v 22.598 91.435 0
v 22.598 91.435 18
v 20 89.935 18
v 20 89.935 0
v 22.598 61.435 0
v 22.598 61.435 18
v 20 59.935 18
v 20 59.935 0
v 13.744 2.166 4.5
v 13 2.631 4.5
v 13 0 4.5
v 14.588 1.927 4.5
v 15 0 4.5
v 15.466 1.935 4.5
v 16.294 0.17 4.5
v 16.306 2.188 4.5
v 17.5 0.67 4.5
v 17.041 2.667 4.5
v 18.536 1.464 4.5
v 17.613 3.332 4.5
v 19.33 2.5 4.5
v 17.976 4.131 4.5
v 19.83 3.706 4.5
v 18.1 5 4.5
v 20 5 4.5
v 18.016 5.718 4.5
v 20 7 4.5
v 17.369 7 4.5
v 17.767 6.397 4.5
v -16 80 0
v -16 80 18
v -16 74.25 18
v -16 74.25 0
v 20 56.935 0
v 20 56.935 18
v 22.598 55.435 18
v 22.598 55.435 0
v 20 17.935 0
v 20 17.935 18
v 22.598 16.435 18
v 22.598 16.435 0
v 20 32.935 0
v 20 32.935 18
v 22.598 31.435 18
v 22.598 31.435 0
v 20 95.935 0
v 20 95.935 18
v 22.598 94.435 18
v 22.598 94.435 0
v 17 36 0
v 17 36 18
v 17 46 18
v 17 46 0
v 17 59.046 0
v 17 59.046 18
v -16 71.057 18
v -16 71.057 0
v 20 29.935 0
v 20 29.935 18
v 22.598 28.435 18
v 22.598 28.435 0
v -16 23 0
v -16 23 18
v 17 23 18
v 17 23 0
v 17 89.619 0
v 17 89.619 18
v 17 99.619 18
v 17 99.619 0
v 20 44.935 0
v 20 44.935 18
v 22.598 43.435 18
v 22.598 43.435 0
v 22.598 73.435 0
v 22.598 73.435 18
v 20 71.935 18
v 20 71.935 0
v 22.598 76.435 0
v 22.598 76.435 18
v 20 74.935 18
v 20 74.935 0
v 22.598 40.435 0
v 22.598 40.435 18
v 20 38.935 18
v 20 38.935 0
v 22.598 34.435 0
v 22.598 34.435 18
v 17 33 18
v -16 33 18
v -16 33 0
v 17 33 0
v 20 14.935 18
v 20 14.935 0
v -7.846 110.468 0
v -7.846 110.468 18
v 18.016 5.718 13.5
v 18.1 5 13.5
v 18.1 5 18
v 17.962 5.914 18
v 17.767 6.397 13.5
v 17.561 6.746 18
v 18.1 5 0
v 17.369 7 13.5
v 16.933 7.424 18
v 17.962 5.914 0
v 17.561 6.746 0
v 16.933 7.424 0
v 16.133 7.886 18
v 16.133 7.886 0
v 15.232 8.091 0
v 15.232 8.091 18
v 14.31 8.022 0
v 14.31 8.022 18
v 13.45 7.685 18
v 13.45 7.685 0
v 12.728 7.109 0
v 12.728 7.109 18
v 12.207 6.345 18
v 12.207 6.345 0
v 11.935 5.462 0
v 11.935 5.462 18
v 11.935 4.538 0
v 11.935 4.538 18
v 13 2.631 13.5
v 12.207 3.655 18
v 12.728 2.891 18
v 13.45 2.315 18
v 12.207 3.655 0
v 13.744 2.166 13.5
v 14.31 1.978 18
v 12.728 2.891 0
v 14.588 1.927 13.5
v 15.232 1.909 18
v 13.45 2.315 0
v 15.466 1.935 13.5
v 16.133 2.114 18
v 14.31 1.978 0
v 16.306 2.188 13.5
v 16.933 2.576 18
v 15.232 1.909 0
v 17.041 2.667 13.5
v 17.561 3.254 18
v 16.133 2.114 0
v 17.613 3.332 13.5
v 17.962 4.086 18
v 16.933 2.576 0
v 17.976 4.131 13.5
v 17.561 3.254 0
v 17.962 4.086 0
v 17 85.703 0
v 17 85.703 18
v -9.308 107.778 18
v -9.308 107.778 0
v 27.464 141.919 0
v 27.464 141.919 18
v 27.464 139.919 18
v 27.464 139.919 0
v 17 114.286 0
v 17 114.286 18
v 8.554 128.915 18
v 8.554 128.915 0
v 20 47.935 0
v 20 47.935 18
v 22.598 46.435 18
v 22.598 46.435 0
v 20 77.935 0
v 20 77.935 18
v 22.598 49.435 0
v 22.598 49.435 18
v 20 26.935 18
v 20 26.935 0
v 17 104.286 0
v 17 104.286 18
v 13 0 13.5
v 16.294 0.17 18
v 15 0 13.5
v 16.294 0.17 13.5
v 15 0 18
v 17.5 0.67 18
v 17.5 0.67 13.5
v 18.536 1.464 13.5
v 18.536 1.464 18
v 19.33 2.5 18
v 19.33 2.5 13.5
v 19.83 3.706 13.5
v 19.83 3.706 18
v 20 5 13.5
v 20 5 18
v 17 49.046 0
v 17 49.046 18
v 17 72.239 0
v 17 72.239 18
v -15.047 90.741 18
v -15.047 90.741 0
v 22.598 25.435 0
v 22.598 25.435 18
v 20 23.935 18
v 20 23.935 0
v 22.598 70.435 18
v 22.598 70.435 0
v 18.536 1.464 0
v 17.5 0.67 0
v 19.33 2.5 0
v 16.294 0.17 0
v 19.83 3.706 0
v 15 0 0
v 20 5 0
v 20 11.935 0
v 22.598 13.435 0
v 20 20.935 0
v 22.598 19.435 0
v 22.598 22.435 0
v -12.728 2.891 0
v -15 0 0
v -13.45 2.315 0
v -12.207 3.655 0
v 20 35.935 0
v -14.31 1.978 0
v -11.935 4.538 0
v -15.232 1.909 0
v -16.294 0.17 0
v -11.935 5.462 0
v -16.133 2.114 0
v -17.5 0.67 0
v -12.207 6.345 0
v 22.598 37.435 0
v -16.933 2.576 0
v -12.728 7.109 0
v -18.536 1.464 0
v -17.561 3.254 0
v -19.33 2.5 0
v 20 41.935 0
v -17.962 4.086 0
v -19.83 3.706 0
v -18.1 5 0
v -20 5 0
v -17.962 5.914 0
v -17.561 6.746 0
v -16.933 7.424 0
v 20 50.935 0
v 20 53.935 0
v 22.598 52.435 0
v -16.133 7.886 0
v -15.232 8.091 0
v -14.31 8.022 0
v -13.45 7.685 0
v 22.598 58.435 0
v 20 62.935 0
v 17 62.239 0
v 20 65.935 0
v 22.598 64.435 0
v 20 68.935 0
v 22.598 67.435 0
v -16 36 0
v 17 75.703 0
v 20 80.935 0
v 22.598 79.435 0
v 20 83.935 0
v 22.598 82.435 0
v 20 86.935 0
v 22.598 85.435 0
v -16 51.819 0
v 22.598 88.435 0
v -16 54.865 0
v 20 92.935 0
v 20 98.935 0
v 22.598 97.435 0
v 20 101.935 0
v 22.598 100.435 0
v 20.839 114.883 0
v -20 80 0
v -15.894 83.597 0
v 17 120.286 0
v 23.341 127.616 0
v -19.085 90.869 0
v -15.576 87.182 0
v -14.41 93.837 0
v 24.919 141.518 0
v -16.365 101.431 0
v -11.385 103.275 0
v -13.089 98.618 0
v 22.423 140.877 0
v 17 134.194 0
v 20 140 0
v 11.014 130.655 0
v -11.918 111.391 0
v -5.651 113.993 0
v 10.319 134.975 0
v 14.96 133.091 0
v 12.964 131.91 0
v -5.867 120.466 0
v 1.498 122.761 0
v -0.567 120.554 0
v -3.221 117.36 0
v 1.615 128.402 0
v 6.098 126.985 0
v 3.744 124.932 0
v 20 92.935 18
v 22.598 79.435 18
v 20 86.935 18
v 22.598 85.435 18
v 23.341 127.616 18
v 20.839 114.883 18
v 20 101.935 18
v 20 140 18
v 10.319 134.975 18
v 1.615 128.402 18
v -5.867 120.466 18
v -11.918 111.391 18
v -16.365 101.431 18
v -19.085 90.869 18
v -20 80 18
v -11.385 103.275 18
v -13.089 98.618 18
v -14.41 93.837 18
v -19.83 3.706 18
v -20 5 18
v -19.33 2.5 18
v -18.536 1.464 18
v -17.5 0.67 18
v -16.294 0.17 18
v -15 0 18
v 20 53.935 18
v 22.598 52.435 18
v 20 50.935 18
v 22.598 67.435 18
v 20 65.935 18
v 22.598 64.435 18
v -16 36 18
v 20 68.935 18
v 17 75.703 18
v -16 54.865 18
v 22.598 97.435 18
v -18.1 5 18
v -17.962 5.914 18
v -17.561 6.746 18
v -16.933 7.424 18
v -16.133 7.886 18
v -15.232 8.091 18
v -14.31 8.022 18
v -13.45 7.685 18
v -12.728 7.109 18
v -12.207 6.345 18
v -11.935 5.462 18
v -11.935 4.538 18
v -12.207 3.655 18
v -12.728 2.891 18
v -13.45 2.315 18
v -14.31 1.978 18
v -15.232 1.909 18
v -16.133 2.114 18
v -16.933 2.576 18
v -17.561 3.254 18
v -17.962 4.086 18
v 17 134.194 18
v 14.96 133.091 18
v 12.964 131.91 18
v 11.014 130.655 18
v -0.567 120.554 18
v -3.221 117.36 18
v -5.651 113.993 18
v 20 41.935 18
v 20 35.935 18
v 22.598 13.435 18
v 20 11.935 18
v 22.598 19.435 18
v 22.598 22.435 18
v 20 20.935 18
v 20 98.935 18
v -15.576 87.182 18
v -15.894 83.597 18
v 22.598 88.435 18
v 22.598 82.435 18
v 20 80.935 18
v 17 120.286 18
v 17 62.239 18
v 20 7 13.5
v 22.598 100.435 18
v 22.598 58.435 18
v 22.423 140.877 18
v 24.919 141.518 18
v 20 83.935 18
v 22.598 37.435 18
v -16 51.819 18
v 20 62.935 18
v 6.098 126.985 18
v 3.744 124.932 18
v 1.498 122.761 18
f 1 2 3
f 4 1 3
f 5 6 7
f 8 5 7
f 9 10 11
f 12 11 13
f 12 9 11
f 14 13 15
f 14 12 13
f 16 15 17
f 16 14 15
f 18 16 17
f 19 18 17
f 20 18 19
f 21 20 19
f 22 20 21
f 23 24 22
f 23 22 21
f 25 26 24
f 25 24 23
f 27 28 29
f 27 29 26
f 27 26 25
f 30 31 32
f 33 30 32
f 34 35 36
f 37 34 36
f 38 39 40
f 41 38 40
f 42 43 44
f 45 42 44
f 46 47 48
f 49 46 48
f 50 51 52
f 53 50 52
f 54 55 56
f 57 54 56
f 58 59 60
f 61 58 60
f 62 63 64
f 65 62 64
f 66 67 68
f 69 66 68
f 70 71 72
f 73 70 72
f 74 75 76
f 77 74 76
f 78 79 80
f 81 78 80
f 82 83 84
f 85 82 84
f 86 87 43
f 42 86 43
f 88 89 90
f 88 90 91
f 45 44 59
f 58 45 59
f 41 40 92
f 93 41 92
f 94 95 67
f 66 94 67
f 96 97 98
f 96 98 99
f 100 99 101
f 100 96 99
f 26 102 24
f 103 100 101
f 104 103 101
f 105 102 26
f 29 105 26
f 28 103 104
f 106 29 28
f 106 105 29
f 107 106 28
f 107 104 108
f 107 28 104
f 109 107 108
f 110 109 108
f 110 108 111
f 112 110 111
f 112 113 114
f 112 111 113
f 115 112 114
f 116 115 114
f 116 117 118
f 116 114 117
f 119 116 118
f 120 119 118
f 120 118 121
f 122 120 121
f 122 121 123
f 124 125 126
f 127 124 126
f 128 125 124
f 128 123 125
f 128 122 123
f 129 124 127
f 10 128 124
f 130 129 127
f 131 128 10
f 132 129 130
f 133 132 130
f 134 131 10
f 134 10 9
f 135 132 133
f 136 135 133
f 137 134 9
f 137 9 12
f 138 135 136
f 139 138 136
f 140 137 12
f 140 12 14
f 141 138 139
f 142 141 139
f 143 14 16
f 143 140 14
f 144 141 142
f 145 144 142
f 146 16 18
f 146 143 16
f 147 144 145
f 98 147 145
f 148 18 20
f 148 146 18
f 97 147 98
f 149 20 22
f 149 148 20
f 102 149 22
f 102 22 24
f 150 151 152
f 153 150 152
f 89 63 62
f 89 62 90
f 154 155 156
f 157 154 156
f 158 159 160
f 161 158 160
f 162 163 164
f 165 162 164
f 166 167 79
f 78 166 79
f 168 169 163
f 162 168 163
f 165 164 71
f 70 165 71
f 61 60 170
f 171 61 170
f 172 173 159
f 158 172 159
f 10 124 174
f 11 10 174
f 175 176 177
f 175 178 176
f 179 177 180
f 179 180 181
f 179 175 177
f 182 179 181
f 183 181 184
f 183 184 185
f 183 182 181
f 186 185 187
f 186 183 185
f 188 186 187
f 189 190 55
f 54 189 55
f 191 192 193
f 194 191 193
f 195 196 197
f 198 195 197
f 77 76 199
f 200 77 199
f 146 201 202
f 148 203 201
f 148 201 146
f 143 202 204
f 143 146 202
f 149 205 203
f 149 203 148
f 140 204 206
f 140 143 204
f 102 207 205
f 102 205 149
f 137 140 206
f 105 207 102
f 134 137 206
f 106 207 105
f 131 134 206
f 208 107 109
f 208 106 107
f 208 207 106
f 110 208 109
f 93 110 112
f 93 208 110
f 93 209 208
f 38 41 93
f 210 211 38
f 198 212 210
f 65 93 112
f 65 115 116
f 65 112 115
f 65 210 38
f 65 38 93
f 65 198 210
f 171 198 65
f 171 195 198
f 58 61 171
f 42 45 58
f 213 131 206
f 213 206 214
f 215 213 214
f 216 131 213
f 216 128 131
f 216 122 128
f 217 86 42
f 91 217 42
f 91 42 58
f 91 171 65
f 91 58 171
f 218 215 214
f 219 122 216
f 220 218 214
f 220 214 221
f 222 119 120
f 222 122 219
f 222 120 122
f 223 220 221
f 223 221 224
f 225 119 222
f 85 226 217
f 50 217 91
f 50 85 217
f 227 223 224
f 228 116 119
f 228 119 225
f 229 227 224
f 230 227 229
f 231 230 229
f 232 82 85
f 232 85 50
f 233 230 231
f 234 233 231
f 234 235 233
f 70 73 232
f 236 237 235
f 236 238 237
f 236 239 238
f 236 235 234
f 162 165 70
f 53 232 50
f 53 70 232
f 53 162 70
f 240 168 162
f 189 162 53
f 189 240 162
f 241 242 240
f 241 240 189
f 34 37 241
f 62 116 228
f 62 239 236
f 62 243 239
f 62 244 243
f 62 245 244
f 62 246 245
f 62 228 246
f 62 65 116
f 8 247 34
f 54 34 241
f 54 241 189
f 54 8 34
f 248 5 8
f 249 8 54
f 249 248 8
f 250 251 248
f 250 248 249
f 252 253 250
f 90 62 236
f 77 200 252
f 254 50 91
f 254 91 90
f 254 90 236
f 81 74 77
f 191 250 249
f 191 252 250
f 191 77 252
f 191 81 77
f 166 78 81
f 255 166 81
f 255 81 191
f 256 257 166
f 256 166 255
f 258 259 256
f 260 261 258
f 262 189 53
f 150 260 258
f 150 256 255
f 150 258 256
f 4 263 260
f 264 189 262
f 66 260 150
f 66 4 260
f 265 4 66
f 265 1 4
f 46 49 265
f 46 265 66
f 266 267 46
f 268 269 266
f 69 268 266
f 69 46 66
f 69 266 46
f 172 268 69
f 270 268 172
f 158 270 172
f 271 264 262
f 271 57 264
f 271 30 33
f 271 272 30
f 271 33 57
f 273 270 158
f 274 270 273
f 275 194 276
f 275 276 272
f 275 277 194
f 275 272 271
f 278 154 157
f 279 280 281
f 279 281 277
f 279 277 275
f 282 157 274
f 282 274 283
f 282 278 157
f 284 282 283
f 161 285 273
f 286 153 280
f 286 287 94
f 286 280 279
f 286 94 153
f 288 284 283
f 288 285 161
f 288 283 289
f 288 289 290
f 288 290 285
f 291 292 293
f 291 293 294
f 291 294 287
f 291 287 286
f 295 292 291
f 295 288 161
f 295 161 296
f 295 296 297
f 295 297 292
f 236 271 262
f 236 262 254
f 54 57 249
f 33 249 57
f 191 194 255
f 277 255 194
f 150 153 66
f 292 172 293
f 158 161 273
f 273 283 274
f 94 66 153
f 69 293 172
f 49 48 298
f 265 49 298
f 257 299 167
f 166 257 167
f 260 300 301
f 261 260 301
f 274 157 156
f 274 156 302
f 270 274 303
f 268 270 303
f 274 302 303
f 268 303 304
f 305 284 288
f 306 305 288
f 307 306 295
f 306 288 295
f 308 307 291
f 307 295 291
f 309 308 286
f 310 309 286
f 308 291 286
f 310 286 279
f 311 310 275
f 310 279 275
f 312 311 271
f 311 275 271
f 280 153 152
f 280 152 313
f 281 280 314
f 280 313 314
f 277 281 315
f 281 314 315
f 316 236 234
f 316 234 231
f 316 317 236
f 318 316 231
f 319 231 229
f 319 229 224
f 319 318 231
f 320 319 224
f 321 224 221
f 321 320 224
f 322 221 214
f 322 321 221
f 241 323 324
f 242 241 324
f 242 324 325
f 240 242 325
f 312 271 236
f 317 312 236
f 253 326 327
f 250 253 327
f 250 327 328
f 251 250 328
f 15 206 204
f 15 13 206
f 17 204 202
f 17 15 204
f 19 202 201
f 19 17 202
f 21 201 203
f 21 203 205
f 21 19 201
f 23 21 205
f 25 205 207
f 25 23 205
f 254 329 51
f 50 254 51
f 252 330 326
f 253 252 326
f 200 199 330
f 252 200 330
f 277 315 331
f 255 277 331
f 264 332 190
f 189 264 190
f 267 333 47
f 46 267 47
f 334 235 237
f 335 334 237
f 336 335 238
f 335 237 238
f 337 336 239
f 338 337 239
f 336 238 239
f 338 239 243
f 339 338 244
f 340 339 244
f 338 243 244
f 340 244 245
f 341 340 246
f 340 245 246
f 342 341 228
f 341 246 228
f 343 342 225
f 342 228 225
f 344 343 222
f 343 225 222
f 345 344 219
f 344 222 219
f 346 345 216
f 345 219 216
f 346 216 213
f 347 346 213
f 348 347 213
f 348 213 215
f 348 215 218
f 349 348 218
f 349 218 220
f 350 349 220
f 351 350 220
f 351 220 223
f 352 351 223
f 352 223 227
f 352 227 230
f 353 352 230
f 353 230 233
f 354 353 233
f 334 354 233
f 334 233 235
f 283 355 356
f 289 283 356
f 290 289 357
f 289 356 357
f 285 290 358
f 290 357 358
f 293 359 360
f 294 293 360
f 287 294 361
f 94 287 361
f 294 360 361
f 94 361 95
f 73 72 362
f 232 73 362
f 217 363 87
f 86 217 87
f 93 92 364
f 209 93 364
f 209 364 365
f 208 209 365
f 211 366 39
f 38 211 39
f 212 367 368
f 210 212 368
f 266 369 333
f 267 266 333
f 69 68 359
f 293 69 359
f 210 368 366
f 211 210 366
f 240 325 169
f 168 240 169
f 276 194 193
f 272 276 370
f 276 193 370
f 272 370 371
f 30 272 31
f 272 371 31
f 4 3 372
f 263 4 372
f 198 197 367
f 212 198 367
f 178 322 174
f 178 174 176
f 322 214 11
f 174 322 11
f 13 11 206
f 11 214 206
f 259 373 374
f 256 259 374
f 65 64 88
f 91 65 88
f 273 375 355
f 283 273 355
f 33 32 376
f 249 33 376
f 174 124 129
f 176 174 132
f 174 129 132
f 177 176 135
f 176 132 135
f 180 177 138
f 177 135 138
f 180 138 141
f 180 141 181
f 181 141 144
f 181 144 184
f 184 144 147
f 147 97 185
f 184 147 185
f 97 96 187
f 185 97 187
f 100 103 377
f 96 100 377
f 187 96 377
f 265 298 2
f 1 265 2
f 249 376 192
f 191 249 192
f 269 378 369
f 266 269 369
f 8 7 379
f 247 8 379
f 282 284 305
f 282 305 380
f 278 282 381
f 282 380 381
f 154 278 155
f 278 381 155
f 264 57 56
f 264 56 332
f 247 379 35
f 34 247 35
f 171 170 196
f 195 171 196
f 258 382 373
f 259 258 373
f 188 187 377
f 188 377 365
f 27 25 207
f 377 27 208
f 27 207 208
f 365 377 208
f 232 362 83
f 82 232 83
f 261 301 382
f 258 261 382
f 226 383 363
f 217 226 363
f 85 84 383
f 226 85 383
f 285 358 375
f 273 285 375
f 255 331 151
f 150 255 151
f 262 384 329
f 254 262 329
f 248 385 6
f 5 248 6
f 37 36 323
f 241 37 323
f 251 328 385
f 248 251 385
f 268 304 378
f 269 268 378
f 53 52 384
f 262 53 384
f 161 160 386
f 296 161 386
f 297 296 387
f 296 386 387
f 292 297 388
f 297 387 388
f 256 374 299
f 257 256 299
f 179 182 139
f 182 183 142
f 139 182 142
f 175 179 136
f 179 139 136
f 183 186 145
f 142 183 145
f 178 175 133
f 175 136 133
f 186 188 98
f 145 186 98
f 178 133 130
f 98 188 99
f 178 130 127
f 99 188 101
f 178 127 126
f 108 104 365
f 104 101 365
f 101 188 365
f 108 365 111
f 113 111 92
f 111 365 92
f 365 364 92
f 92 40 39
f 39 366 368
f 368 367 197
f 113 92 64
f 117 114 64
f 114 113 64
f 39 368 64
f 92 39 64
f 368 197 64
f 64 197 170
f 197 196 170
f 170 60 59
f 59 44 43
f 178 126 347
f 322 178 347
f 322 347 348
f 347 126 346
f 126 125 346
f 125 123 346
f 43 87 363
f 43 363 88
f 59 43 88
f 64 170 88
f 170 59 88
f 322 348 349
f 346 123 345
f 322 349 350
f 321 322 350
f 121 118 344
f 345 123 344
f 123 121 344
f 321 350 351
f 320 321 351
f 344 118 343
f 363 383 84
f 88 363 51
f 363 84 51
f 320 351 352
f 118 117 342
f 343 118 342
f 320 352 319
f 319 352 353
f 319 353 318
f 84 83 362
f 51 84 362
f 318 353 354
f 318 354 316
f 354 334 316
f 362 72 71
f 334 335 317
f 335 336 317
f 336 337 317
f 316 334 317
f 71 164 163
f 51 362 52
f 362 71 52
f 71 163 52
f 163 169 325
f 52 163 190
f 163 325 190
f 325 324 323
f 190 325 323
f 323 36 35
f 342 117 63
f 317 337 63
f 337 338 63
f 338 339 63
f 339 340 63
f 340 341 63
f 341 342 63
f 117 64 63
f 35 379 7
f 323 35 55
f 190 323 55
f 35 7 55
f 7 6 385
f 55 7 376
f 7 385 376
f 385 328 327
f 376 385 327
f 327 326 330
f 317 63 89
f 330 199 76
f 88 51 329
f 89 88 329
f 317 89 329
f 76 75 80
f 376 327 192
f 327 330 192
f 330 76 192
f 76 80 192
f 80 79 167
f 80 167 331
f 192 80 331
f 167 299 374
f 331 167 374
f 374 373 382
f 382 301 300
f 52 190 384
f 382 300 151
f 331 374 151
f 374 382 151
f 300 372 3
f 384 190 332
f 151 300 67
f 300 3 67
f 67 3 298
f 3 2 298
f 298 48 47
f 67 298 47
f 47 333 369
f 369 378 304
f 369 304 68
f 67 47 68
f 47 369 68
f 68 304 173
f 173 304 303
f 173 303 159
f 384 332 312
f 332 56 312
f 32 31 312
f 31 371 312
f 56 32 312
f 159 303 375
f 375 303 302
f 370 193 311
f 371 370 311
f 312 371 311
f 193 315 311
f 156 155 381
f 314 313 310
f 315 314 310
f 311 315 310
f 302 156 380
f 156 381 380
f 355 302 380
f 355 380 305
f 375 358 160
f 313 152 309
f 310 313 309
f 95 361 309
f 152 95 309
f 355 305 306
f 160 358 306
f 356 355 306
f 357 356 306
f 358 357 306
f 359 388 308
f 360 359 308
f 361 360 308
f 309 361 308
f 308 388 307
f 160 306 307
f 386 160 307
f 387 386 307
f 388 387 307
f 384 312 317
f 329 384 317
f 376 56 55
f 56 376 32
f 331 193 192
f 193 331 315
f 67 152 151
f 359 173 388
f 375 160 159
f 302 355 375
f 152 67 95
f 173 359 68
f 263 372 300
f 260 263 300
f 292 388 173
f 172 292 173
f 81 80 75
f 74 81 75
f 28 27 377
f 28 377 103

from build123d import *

# Parameters (mm, degrees)
BOSS_EXTRUDE1_DEPTH     = 18
SKETCH3_W               = 33
SKETCH3_H               = 10
CUT_EXTRUDE1_DEPTH      = 143.562267098
CUT_EXTRUDE2_DEPTH      = 143.562267098
CUT_EXTRUDE3_DEPTH      = 143.562267098
CUT_EXTRUDE4_DEPTH      = 143.562267098
BOSS_EXTRUDE2_DEPTH     = 18
BOSS_EXTRUDE3_DEPTH     = 18
LPATTERN1_COUNT         = 30
LPATTERN1_PITCH         = 3
CUT_EXTRUDE5_DEPTH      = 146.668613805
CUT_EXTRUDE6_DEPTH      = 146.668613805
CUT_EXTRUDE7_DEPTH      = 146.668613805
CUT_EXTRUDE8_DEPTH      = 146.668613805
CUT_EXTRUDE9_DEPTH      = 4.5
CUT_EXTRUDE9_DEPTH_BACK = 4.5
FILLET1_R               = 5
F_6_0_MM_DOWEL_HOLES1_D = 6.2


with BuildPart() as part:
    # Sketch2 → Boss-Extrude1 (new body)
    with BuildSketch(Plane.XY):
        with BuildLine():
            Line((-20, 0), (20, 0))
            Line((20, 0), (20, 140))
            ThreePointArc((20, 140), (-9.083269132, 116.055512755), (-20, 80))
            Line((-20, 80), (-20, 0))
        make_face()
    extrude(amount=BOSS_EXTRUDE1_DEPTH)

    # Sketch3 → Cut-Extrude1 (cut, through all)
    with BuildSketch(Plane.XY.offset(18)):
        with Locations((0.5, 28)):
            Rectangle(SKETCH3_W, SKETCH3_H)
    extrude(amount=-CUT_EXTRUDE1_DEPTH, mode=Mode.SUBTRACT)

    # Sketch4 → Cut-Extrude2 (cut, through all)
    with BuildSketch(Plane.XY.offset(18)):
        Polygon((-16, 36), (17, 36), (17, 46), (-16, 51.818790363), align=None)
    extrude(amount=-CUT_EXTRUDE2_DEPTH, mode=Mode.SUBTRACT)

    # Sketch5 → Cut-Extrude3 (cut, through all)
    with BuildSketch(Plane.XY.offset(18)):
        Polygon((-16, 54.865070199), (17, 49.046279836), (17, 59.046279836), (-16, 71.057297566), align=None)
    extrude(amount=-CUT_EXTRUDE3_DEPTH, mode=Mode.SUBTRACT)

    # Sketch6 → Cut-Extrude4 (cut, through all)
    with BuildSketch(Plane.XY.offset(18)):
        with BuildLine():
            Line((-16, 74.249830884), (17, 62.238813153))
            Line((17, 62.238813153), (17, 72.238813153))
            Line((17, 72.238813153), (-15.046889298, 90.741093316))
            ThreePointArc((-15.046889298, 90.741093316), (-15.761255119, 85.391648765), (-16, 80))
            Line((-16, 80), (-16, 74.249830884))
        make_face()
    extrude(amount=-CUT_EXTRUDE4_DEPTH, mode=Mode.SUBTRACT)

    # Sketch13 → Boss-Extrude2 (add)
    with BuildSketch(Plane.XY.offset(18)):
        with BuildLine():
            Line((27.463865989, 141.919276749), (27.463865989, 139.919276749))
            ThreePointArc((27.463865989, 139.919276749), (21.883638711, 121.290161062), (20, 101.934676234))
            Line((20, 101.934676234), (20, 140))
            ThreePointArc((20, 140), (23.663152719, 141.227117654), (27.463865989, 141.919276749))
        make_face()
    extrude(amount=-BOSS_EXTRUDE2_DEPTH)

    # Sketch15 → Boss-Extrude3 (add)
    with BuildSketch(Plane.XY.offset(18)):
        Polygon((20, 101.934676234), (22.598076211, 100.434676234), (20, 98.934676234), align=None)
    boss_extrude3 = extrude(amount=-BOSS_EXTRUDE3_DEPTH)

    # LPattern1: Boss-Extrude3 ×30
    with Locations(*[(0, -i * LPATTERN1_PITCH, 0) for i in range(1, LPATTERN1_COUNT)]):
        add(boss_extrude3)

    # Sketch17 → Cut-Extrude5 (cut, through all)
    with BuildSketch(Plane.XY.offset(18)):
        with BuildLine():
            Line((-14.409820926, 93.837383335), (17, 75.702914768))
            Line((17, 75.702914768), (17, 85.702914768))
            Line((17, 85.702914768), (-9.308172311, 107.778092451))
            ThreePointArc((-9.308172311, 107.778092451), (-12.284651864, 100.963507838), (-14.409820926, 93.837383335))
        make_face()
    extrude(amount=-CUT_EXTRUDE5_DEPTH, mode=Mode.SUBTRACT)

    # Sketch18 → Cut-Extrude6 (cut, through all)
    with BuildSketch(Plane.XY.offset(18)):
        with BuildLine():
            Line((-7.846238812, 110.46760646), (17, 89.619136636))
            Line((17, 89.619136636), (17, 99.619136636))
            Line((17, 99.619136636), (-0.566824758, 120.554463152))
            ThreePointArc((-0.566824758, 120.554463152), (-4.464319866, 115.697073553), (-7.846238812, 110.46760646))
        make_face()
    extrude(amount=-CUT_EXTRUDE6_DEPTH, mode=Mode.SUBTRACT)

    # Sketch19 → Cut-Extrude7 (cut, through all)
    with BuildSketch(Plane.XY.offset(18)):
        with BuildLine():
            Line((1.497556464, 122.761400894), (17, 104.286308117))
            Line((17, 104.286308117), (17, 114.286308117))
            Line((17, 114.286308117), (8.554035532, 128.915147695))
            ThreePointArc((8.554035532, 128.915147695), (4.907555132, 125.973860666), (1.497556464, 122.761400894))
        make_face()
    extrude(amount=-CUT_EXTRUDE7_DEPTH, mode=Mode.SUBTRACT)

    # Sketch21 → Cut-Extrude8 (cut, through all)
    with BuildSketch(Plane.XY.offset(18)):
        with BuildLine():
            Line((11.013641865, 130.654984559), (17, 120.286308117))
            Line((17, 120.286308117), (17, 134.194095619))
            ThreePointArc((17, 134.194095619), (13.956345649, 132.509918344), (11.013641865, 130.654984559))
        make_face()
    extrude(amount=-CUT_EXTRUDE8_DEPTH, mode=Mode.SUBTRACT)

    # Sketch25 → Cut-Extrude9 (cut, two sides: drawn at the far end of the back side and taken through both)
    with BuildSketch(Plane(origin=(0, 0, 9), x_dir=(-1, 0, 0), z_dir=(0, 0, -1)).offset(-CUT_EXTRUDE9_DEPTH_BACK)):
        with BuildLine():
            Line((-20, 0), (-20, 7))
            Line((-20, 7), (-17, 7))
            ThreePointArc((-17, 7), (-14.171572875, 5.828427125), (-13, 3))
            Line((-13, 3), (-13, 0))
            Line((-13, 0), (-20, 0))
        make_face()
    extrude(amount=CUT_EXTRUDE9_DEPTH + CUT_EXTRUDE9_DEPTH_BACK, mode=Mode.SUBTRACT)

    # Fillet1
    fillet1_edges = [part.edges().sort_by_distance(p)[0] for p in [
        (20, 0, 2.25),
        (20, 0, 15.75),
        (-20, 0, 9),
    ]]
    fillet(fillet1_edges, radius=FILLET1_R)

    # Ø6.0 mm Dowel Holes1 (through all)
    with Locations(Plane.XY.offset(18)):
        with Locations((-15, 5)):
            f_6_0_mm_dowel_holes1 = Hole(F_6_0_MM_DOWEL_HOLES1_D / 2)

    # Mirror1: Ø6.0 mm Dowel Holes1 across plane
    add(f_6_0_mm_dowel_holes1.mirror(Plane(origin=(0, 0, 0), x_dir=(0, 0, 1), z_dir=(1, 0, 0))), mode=Mode.SUBTRACT)


solid = part.part
